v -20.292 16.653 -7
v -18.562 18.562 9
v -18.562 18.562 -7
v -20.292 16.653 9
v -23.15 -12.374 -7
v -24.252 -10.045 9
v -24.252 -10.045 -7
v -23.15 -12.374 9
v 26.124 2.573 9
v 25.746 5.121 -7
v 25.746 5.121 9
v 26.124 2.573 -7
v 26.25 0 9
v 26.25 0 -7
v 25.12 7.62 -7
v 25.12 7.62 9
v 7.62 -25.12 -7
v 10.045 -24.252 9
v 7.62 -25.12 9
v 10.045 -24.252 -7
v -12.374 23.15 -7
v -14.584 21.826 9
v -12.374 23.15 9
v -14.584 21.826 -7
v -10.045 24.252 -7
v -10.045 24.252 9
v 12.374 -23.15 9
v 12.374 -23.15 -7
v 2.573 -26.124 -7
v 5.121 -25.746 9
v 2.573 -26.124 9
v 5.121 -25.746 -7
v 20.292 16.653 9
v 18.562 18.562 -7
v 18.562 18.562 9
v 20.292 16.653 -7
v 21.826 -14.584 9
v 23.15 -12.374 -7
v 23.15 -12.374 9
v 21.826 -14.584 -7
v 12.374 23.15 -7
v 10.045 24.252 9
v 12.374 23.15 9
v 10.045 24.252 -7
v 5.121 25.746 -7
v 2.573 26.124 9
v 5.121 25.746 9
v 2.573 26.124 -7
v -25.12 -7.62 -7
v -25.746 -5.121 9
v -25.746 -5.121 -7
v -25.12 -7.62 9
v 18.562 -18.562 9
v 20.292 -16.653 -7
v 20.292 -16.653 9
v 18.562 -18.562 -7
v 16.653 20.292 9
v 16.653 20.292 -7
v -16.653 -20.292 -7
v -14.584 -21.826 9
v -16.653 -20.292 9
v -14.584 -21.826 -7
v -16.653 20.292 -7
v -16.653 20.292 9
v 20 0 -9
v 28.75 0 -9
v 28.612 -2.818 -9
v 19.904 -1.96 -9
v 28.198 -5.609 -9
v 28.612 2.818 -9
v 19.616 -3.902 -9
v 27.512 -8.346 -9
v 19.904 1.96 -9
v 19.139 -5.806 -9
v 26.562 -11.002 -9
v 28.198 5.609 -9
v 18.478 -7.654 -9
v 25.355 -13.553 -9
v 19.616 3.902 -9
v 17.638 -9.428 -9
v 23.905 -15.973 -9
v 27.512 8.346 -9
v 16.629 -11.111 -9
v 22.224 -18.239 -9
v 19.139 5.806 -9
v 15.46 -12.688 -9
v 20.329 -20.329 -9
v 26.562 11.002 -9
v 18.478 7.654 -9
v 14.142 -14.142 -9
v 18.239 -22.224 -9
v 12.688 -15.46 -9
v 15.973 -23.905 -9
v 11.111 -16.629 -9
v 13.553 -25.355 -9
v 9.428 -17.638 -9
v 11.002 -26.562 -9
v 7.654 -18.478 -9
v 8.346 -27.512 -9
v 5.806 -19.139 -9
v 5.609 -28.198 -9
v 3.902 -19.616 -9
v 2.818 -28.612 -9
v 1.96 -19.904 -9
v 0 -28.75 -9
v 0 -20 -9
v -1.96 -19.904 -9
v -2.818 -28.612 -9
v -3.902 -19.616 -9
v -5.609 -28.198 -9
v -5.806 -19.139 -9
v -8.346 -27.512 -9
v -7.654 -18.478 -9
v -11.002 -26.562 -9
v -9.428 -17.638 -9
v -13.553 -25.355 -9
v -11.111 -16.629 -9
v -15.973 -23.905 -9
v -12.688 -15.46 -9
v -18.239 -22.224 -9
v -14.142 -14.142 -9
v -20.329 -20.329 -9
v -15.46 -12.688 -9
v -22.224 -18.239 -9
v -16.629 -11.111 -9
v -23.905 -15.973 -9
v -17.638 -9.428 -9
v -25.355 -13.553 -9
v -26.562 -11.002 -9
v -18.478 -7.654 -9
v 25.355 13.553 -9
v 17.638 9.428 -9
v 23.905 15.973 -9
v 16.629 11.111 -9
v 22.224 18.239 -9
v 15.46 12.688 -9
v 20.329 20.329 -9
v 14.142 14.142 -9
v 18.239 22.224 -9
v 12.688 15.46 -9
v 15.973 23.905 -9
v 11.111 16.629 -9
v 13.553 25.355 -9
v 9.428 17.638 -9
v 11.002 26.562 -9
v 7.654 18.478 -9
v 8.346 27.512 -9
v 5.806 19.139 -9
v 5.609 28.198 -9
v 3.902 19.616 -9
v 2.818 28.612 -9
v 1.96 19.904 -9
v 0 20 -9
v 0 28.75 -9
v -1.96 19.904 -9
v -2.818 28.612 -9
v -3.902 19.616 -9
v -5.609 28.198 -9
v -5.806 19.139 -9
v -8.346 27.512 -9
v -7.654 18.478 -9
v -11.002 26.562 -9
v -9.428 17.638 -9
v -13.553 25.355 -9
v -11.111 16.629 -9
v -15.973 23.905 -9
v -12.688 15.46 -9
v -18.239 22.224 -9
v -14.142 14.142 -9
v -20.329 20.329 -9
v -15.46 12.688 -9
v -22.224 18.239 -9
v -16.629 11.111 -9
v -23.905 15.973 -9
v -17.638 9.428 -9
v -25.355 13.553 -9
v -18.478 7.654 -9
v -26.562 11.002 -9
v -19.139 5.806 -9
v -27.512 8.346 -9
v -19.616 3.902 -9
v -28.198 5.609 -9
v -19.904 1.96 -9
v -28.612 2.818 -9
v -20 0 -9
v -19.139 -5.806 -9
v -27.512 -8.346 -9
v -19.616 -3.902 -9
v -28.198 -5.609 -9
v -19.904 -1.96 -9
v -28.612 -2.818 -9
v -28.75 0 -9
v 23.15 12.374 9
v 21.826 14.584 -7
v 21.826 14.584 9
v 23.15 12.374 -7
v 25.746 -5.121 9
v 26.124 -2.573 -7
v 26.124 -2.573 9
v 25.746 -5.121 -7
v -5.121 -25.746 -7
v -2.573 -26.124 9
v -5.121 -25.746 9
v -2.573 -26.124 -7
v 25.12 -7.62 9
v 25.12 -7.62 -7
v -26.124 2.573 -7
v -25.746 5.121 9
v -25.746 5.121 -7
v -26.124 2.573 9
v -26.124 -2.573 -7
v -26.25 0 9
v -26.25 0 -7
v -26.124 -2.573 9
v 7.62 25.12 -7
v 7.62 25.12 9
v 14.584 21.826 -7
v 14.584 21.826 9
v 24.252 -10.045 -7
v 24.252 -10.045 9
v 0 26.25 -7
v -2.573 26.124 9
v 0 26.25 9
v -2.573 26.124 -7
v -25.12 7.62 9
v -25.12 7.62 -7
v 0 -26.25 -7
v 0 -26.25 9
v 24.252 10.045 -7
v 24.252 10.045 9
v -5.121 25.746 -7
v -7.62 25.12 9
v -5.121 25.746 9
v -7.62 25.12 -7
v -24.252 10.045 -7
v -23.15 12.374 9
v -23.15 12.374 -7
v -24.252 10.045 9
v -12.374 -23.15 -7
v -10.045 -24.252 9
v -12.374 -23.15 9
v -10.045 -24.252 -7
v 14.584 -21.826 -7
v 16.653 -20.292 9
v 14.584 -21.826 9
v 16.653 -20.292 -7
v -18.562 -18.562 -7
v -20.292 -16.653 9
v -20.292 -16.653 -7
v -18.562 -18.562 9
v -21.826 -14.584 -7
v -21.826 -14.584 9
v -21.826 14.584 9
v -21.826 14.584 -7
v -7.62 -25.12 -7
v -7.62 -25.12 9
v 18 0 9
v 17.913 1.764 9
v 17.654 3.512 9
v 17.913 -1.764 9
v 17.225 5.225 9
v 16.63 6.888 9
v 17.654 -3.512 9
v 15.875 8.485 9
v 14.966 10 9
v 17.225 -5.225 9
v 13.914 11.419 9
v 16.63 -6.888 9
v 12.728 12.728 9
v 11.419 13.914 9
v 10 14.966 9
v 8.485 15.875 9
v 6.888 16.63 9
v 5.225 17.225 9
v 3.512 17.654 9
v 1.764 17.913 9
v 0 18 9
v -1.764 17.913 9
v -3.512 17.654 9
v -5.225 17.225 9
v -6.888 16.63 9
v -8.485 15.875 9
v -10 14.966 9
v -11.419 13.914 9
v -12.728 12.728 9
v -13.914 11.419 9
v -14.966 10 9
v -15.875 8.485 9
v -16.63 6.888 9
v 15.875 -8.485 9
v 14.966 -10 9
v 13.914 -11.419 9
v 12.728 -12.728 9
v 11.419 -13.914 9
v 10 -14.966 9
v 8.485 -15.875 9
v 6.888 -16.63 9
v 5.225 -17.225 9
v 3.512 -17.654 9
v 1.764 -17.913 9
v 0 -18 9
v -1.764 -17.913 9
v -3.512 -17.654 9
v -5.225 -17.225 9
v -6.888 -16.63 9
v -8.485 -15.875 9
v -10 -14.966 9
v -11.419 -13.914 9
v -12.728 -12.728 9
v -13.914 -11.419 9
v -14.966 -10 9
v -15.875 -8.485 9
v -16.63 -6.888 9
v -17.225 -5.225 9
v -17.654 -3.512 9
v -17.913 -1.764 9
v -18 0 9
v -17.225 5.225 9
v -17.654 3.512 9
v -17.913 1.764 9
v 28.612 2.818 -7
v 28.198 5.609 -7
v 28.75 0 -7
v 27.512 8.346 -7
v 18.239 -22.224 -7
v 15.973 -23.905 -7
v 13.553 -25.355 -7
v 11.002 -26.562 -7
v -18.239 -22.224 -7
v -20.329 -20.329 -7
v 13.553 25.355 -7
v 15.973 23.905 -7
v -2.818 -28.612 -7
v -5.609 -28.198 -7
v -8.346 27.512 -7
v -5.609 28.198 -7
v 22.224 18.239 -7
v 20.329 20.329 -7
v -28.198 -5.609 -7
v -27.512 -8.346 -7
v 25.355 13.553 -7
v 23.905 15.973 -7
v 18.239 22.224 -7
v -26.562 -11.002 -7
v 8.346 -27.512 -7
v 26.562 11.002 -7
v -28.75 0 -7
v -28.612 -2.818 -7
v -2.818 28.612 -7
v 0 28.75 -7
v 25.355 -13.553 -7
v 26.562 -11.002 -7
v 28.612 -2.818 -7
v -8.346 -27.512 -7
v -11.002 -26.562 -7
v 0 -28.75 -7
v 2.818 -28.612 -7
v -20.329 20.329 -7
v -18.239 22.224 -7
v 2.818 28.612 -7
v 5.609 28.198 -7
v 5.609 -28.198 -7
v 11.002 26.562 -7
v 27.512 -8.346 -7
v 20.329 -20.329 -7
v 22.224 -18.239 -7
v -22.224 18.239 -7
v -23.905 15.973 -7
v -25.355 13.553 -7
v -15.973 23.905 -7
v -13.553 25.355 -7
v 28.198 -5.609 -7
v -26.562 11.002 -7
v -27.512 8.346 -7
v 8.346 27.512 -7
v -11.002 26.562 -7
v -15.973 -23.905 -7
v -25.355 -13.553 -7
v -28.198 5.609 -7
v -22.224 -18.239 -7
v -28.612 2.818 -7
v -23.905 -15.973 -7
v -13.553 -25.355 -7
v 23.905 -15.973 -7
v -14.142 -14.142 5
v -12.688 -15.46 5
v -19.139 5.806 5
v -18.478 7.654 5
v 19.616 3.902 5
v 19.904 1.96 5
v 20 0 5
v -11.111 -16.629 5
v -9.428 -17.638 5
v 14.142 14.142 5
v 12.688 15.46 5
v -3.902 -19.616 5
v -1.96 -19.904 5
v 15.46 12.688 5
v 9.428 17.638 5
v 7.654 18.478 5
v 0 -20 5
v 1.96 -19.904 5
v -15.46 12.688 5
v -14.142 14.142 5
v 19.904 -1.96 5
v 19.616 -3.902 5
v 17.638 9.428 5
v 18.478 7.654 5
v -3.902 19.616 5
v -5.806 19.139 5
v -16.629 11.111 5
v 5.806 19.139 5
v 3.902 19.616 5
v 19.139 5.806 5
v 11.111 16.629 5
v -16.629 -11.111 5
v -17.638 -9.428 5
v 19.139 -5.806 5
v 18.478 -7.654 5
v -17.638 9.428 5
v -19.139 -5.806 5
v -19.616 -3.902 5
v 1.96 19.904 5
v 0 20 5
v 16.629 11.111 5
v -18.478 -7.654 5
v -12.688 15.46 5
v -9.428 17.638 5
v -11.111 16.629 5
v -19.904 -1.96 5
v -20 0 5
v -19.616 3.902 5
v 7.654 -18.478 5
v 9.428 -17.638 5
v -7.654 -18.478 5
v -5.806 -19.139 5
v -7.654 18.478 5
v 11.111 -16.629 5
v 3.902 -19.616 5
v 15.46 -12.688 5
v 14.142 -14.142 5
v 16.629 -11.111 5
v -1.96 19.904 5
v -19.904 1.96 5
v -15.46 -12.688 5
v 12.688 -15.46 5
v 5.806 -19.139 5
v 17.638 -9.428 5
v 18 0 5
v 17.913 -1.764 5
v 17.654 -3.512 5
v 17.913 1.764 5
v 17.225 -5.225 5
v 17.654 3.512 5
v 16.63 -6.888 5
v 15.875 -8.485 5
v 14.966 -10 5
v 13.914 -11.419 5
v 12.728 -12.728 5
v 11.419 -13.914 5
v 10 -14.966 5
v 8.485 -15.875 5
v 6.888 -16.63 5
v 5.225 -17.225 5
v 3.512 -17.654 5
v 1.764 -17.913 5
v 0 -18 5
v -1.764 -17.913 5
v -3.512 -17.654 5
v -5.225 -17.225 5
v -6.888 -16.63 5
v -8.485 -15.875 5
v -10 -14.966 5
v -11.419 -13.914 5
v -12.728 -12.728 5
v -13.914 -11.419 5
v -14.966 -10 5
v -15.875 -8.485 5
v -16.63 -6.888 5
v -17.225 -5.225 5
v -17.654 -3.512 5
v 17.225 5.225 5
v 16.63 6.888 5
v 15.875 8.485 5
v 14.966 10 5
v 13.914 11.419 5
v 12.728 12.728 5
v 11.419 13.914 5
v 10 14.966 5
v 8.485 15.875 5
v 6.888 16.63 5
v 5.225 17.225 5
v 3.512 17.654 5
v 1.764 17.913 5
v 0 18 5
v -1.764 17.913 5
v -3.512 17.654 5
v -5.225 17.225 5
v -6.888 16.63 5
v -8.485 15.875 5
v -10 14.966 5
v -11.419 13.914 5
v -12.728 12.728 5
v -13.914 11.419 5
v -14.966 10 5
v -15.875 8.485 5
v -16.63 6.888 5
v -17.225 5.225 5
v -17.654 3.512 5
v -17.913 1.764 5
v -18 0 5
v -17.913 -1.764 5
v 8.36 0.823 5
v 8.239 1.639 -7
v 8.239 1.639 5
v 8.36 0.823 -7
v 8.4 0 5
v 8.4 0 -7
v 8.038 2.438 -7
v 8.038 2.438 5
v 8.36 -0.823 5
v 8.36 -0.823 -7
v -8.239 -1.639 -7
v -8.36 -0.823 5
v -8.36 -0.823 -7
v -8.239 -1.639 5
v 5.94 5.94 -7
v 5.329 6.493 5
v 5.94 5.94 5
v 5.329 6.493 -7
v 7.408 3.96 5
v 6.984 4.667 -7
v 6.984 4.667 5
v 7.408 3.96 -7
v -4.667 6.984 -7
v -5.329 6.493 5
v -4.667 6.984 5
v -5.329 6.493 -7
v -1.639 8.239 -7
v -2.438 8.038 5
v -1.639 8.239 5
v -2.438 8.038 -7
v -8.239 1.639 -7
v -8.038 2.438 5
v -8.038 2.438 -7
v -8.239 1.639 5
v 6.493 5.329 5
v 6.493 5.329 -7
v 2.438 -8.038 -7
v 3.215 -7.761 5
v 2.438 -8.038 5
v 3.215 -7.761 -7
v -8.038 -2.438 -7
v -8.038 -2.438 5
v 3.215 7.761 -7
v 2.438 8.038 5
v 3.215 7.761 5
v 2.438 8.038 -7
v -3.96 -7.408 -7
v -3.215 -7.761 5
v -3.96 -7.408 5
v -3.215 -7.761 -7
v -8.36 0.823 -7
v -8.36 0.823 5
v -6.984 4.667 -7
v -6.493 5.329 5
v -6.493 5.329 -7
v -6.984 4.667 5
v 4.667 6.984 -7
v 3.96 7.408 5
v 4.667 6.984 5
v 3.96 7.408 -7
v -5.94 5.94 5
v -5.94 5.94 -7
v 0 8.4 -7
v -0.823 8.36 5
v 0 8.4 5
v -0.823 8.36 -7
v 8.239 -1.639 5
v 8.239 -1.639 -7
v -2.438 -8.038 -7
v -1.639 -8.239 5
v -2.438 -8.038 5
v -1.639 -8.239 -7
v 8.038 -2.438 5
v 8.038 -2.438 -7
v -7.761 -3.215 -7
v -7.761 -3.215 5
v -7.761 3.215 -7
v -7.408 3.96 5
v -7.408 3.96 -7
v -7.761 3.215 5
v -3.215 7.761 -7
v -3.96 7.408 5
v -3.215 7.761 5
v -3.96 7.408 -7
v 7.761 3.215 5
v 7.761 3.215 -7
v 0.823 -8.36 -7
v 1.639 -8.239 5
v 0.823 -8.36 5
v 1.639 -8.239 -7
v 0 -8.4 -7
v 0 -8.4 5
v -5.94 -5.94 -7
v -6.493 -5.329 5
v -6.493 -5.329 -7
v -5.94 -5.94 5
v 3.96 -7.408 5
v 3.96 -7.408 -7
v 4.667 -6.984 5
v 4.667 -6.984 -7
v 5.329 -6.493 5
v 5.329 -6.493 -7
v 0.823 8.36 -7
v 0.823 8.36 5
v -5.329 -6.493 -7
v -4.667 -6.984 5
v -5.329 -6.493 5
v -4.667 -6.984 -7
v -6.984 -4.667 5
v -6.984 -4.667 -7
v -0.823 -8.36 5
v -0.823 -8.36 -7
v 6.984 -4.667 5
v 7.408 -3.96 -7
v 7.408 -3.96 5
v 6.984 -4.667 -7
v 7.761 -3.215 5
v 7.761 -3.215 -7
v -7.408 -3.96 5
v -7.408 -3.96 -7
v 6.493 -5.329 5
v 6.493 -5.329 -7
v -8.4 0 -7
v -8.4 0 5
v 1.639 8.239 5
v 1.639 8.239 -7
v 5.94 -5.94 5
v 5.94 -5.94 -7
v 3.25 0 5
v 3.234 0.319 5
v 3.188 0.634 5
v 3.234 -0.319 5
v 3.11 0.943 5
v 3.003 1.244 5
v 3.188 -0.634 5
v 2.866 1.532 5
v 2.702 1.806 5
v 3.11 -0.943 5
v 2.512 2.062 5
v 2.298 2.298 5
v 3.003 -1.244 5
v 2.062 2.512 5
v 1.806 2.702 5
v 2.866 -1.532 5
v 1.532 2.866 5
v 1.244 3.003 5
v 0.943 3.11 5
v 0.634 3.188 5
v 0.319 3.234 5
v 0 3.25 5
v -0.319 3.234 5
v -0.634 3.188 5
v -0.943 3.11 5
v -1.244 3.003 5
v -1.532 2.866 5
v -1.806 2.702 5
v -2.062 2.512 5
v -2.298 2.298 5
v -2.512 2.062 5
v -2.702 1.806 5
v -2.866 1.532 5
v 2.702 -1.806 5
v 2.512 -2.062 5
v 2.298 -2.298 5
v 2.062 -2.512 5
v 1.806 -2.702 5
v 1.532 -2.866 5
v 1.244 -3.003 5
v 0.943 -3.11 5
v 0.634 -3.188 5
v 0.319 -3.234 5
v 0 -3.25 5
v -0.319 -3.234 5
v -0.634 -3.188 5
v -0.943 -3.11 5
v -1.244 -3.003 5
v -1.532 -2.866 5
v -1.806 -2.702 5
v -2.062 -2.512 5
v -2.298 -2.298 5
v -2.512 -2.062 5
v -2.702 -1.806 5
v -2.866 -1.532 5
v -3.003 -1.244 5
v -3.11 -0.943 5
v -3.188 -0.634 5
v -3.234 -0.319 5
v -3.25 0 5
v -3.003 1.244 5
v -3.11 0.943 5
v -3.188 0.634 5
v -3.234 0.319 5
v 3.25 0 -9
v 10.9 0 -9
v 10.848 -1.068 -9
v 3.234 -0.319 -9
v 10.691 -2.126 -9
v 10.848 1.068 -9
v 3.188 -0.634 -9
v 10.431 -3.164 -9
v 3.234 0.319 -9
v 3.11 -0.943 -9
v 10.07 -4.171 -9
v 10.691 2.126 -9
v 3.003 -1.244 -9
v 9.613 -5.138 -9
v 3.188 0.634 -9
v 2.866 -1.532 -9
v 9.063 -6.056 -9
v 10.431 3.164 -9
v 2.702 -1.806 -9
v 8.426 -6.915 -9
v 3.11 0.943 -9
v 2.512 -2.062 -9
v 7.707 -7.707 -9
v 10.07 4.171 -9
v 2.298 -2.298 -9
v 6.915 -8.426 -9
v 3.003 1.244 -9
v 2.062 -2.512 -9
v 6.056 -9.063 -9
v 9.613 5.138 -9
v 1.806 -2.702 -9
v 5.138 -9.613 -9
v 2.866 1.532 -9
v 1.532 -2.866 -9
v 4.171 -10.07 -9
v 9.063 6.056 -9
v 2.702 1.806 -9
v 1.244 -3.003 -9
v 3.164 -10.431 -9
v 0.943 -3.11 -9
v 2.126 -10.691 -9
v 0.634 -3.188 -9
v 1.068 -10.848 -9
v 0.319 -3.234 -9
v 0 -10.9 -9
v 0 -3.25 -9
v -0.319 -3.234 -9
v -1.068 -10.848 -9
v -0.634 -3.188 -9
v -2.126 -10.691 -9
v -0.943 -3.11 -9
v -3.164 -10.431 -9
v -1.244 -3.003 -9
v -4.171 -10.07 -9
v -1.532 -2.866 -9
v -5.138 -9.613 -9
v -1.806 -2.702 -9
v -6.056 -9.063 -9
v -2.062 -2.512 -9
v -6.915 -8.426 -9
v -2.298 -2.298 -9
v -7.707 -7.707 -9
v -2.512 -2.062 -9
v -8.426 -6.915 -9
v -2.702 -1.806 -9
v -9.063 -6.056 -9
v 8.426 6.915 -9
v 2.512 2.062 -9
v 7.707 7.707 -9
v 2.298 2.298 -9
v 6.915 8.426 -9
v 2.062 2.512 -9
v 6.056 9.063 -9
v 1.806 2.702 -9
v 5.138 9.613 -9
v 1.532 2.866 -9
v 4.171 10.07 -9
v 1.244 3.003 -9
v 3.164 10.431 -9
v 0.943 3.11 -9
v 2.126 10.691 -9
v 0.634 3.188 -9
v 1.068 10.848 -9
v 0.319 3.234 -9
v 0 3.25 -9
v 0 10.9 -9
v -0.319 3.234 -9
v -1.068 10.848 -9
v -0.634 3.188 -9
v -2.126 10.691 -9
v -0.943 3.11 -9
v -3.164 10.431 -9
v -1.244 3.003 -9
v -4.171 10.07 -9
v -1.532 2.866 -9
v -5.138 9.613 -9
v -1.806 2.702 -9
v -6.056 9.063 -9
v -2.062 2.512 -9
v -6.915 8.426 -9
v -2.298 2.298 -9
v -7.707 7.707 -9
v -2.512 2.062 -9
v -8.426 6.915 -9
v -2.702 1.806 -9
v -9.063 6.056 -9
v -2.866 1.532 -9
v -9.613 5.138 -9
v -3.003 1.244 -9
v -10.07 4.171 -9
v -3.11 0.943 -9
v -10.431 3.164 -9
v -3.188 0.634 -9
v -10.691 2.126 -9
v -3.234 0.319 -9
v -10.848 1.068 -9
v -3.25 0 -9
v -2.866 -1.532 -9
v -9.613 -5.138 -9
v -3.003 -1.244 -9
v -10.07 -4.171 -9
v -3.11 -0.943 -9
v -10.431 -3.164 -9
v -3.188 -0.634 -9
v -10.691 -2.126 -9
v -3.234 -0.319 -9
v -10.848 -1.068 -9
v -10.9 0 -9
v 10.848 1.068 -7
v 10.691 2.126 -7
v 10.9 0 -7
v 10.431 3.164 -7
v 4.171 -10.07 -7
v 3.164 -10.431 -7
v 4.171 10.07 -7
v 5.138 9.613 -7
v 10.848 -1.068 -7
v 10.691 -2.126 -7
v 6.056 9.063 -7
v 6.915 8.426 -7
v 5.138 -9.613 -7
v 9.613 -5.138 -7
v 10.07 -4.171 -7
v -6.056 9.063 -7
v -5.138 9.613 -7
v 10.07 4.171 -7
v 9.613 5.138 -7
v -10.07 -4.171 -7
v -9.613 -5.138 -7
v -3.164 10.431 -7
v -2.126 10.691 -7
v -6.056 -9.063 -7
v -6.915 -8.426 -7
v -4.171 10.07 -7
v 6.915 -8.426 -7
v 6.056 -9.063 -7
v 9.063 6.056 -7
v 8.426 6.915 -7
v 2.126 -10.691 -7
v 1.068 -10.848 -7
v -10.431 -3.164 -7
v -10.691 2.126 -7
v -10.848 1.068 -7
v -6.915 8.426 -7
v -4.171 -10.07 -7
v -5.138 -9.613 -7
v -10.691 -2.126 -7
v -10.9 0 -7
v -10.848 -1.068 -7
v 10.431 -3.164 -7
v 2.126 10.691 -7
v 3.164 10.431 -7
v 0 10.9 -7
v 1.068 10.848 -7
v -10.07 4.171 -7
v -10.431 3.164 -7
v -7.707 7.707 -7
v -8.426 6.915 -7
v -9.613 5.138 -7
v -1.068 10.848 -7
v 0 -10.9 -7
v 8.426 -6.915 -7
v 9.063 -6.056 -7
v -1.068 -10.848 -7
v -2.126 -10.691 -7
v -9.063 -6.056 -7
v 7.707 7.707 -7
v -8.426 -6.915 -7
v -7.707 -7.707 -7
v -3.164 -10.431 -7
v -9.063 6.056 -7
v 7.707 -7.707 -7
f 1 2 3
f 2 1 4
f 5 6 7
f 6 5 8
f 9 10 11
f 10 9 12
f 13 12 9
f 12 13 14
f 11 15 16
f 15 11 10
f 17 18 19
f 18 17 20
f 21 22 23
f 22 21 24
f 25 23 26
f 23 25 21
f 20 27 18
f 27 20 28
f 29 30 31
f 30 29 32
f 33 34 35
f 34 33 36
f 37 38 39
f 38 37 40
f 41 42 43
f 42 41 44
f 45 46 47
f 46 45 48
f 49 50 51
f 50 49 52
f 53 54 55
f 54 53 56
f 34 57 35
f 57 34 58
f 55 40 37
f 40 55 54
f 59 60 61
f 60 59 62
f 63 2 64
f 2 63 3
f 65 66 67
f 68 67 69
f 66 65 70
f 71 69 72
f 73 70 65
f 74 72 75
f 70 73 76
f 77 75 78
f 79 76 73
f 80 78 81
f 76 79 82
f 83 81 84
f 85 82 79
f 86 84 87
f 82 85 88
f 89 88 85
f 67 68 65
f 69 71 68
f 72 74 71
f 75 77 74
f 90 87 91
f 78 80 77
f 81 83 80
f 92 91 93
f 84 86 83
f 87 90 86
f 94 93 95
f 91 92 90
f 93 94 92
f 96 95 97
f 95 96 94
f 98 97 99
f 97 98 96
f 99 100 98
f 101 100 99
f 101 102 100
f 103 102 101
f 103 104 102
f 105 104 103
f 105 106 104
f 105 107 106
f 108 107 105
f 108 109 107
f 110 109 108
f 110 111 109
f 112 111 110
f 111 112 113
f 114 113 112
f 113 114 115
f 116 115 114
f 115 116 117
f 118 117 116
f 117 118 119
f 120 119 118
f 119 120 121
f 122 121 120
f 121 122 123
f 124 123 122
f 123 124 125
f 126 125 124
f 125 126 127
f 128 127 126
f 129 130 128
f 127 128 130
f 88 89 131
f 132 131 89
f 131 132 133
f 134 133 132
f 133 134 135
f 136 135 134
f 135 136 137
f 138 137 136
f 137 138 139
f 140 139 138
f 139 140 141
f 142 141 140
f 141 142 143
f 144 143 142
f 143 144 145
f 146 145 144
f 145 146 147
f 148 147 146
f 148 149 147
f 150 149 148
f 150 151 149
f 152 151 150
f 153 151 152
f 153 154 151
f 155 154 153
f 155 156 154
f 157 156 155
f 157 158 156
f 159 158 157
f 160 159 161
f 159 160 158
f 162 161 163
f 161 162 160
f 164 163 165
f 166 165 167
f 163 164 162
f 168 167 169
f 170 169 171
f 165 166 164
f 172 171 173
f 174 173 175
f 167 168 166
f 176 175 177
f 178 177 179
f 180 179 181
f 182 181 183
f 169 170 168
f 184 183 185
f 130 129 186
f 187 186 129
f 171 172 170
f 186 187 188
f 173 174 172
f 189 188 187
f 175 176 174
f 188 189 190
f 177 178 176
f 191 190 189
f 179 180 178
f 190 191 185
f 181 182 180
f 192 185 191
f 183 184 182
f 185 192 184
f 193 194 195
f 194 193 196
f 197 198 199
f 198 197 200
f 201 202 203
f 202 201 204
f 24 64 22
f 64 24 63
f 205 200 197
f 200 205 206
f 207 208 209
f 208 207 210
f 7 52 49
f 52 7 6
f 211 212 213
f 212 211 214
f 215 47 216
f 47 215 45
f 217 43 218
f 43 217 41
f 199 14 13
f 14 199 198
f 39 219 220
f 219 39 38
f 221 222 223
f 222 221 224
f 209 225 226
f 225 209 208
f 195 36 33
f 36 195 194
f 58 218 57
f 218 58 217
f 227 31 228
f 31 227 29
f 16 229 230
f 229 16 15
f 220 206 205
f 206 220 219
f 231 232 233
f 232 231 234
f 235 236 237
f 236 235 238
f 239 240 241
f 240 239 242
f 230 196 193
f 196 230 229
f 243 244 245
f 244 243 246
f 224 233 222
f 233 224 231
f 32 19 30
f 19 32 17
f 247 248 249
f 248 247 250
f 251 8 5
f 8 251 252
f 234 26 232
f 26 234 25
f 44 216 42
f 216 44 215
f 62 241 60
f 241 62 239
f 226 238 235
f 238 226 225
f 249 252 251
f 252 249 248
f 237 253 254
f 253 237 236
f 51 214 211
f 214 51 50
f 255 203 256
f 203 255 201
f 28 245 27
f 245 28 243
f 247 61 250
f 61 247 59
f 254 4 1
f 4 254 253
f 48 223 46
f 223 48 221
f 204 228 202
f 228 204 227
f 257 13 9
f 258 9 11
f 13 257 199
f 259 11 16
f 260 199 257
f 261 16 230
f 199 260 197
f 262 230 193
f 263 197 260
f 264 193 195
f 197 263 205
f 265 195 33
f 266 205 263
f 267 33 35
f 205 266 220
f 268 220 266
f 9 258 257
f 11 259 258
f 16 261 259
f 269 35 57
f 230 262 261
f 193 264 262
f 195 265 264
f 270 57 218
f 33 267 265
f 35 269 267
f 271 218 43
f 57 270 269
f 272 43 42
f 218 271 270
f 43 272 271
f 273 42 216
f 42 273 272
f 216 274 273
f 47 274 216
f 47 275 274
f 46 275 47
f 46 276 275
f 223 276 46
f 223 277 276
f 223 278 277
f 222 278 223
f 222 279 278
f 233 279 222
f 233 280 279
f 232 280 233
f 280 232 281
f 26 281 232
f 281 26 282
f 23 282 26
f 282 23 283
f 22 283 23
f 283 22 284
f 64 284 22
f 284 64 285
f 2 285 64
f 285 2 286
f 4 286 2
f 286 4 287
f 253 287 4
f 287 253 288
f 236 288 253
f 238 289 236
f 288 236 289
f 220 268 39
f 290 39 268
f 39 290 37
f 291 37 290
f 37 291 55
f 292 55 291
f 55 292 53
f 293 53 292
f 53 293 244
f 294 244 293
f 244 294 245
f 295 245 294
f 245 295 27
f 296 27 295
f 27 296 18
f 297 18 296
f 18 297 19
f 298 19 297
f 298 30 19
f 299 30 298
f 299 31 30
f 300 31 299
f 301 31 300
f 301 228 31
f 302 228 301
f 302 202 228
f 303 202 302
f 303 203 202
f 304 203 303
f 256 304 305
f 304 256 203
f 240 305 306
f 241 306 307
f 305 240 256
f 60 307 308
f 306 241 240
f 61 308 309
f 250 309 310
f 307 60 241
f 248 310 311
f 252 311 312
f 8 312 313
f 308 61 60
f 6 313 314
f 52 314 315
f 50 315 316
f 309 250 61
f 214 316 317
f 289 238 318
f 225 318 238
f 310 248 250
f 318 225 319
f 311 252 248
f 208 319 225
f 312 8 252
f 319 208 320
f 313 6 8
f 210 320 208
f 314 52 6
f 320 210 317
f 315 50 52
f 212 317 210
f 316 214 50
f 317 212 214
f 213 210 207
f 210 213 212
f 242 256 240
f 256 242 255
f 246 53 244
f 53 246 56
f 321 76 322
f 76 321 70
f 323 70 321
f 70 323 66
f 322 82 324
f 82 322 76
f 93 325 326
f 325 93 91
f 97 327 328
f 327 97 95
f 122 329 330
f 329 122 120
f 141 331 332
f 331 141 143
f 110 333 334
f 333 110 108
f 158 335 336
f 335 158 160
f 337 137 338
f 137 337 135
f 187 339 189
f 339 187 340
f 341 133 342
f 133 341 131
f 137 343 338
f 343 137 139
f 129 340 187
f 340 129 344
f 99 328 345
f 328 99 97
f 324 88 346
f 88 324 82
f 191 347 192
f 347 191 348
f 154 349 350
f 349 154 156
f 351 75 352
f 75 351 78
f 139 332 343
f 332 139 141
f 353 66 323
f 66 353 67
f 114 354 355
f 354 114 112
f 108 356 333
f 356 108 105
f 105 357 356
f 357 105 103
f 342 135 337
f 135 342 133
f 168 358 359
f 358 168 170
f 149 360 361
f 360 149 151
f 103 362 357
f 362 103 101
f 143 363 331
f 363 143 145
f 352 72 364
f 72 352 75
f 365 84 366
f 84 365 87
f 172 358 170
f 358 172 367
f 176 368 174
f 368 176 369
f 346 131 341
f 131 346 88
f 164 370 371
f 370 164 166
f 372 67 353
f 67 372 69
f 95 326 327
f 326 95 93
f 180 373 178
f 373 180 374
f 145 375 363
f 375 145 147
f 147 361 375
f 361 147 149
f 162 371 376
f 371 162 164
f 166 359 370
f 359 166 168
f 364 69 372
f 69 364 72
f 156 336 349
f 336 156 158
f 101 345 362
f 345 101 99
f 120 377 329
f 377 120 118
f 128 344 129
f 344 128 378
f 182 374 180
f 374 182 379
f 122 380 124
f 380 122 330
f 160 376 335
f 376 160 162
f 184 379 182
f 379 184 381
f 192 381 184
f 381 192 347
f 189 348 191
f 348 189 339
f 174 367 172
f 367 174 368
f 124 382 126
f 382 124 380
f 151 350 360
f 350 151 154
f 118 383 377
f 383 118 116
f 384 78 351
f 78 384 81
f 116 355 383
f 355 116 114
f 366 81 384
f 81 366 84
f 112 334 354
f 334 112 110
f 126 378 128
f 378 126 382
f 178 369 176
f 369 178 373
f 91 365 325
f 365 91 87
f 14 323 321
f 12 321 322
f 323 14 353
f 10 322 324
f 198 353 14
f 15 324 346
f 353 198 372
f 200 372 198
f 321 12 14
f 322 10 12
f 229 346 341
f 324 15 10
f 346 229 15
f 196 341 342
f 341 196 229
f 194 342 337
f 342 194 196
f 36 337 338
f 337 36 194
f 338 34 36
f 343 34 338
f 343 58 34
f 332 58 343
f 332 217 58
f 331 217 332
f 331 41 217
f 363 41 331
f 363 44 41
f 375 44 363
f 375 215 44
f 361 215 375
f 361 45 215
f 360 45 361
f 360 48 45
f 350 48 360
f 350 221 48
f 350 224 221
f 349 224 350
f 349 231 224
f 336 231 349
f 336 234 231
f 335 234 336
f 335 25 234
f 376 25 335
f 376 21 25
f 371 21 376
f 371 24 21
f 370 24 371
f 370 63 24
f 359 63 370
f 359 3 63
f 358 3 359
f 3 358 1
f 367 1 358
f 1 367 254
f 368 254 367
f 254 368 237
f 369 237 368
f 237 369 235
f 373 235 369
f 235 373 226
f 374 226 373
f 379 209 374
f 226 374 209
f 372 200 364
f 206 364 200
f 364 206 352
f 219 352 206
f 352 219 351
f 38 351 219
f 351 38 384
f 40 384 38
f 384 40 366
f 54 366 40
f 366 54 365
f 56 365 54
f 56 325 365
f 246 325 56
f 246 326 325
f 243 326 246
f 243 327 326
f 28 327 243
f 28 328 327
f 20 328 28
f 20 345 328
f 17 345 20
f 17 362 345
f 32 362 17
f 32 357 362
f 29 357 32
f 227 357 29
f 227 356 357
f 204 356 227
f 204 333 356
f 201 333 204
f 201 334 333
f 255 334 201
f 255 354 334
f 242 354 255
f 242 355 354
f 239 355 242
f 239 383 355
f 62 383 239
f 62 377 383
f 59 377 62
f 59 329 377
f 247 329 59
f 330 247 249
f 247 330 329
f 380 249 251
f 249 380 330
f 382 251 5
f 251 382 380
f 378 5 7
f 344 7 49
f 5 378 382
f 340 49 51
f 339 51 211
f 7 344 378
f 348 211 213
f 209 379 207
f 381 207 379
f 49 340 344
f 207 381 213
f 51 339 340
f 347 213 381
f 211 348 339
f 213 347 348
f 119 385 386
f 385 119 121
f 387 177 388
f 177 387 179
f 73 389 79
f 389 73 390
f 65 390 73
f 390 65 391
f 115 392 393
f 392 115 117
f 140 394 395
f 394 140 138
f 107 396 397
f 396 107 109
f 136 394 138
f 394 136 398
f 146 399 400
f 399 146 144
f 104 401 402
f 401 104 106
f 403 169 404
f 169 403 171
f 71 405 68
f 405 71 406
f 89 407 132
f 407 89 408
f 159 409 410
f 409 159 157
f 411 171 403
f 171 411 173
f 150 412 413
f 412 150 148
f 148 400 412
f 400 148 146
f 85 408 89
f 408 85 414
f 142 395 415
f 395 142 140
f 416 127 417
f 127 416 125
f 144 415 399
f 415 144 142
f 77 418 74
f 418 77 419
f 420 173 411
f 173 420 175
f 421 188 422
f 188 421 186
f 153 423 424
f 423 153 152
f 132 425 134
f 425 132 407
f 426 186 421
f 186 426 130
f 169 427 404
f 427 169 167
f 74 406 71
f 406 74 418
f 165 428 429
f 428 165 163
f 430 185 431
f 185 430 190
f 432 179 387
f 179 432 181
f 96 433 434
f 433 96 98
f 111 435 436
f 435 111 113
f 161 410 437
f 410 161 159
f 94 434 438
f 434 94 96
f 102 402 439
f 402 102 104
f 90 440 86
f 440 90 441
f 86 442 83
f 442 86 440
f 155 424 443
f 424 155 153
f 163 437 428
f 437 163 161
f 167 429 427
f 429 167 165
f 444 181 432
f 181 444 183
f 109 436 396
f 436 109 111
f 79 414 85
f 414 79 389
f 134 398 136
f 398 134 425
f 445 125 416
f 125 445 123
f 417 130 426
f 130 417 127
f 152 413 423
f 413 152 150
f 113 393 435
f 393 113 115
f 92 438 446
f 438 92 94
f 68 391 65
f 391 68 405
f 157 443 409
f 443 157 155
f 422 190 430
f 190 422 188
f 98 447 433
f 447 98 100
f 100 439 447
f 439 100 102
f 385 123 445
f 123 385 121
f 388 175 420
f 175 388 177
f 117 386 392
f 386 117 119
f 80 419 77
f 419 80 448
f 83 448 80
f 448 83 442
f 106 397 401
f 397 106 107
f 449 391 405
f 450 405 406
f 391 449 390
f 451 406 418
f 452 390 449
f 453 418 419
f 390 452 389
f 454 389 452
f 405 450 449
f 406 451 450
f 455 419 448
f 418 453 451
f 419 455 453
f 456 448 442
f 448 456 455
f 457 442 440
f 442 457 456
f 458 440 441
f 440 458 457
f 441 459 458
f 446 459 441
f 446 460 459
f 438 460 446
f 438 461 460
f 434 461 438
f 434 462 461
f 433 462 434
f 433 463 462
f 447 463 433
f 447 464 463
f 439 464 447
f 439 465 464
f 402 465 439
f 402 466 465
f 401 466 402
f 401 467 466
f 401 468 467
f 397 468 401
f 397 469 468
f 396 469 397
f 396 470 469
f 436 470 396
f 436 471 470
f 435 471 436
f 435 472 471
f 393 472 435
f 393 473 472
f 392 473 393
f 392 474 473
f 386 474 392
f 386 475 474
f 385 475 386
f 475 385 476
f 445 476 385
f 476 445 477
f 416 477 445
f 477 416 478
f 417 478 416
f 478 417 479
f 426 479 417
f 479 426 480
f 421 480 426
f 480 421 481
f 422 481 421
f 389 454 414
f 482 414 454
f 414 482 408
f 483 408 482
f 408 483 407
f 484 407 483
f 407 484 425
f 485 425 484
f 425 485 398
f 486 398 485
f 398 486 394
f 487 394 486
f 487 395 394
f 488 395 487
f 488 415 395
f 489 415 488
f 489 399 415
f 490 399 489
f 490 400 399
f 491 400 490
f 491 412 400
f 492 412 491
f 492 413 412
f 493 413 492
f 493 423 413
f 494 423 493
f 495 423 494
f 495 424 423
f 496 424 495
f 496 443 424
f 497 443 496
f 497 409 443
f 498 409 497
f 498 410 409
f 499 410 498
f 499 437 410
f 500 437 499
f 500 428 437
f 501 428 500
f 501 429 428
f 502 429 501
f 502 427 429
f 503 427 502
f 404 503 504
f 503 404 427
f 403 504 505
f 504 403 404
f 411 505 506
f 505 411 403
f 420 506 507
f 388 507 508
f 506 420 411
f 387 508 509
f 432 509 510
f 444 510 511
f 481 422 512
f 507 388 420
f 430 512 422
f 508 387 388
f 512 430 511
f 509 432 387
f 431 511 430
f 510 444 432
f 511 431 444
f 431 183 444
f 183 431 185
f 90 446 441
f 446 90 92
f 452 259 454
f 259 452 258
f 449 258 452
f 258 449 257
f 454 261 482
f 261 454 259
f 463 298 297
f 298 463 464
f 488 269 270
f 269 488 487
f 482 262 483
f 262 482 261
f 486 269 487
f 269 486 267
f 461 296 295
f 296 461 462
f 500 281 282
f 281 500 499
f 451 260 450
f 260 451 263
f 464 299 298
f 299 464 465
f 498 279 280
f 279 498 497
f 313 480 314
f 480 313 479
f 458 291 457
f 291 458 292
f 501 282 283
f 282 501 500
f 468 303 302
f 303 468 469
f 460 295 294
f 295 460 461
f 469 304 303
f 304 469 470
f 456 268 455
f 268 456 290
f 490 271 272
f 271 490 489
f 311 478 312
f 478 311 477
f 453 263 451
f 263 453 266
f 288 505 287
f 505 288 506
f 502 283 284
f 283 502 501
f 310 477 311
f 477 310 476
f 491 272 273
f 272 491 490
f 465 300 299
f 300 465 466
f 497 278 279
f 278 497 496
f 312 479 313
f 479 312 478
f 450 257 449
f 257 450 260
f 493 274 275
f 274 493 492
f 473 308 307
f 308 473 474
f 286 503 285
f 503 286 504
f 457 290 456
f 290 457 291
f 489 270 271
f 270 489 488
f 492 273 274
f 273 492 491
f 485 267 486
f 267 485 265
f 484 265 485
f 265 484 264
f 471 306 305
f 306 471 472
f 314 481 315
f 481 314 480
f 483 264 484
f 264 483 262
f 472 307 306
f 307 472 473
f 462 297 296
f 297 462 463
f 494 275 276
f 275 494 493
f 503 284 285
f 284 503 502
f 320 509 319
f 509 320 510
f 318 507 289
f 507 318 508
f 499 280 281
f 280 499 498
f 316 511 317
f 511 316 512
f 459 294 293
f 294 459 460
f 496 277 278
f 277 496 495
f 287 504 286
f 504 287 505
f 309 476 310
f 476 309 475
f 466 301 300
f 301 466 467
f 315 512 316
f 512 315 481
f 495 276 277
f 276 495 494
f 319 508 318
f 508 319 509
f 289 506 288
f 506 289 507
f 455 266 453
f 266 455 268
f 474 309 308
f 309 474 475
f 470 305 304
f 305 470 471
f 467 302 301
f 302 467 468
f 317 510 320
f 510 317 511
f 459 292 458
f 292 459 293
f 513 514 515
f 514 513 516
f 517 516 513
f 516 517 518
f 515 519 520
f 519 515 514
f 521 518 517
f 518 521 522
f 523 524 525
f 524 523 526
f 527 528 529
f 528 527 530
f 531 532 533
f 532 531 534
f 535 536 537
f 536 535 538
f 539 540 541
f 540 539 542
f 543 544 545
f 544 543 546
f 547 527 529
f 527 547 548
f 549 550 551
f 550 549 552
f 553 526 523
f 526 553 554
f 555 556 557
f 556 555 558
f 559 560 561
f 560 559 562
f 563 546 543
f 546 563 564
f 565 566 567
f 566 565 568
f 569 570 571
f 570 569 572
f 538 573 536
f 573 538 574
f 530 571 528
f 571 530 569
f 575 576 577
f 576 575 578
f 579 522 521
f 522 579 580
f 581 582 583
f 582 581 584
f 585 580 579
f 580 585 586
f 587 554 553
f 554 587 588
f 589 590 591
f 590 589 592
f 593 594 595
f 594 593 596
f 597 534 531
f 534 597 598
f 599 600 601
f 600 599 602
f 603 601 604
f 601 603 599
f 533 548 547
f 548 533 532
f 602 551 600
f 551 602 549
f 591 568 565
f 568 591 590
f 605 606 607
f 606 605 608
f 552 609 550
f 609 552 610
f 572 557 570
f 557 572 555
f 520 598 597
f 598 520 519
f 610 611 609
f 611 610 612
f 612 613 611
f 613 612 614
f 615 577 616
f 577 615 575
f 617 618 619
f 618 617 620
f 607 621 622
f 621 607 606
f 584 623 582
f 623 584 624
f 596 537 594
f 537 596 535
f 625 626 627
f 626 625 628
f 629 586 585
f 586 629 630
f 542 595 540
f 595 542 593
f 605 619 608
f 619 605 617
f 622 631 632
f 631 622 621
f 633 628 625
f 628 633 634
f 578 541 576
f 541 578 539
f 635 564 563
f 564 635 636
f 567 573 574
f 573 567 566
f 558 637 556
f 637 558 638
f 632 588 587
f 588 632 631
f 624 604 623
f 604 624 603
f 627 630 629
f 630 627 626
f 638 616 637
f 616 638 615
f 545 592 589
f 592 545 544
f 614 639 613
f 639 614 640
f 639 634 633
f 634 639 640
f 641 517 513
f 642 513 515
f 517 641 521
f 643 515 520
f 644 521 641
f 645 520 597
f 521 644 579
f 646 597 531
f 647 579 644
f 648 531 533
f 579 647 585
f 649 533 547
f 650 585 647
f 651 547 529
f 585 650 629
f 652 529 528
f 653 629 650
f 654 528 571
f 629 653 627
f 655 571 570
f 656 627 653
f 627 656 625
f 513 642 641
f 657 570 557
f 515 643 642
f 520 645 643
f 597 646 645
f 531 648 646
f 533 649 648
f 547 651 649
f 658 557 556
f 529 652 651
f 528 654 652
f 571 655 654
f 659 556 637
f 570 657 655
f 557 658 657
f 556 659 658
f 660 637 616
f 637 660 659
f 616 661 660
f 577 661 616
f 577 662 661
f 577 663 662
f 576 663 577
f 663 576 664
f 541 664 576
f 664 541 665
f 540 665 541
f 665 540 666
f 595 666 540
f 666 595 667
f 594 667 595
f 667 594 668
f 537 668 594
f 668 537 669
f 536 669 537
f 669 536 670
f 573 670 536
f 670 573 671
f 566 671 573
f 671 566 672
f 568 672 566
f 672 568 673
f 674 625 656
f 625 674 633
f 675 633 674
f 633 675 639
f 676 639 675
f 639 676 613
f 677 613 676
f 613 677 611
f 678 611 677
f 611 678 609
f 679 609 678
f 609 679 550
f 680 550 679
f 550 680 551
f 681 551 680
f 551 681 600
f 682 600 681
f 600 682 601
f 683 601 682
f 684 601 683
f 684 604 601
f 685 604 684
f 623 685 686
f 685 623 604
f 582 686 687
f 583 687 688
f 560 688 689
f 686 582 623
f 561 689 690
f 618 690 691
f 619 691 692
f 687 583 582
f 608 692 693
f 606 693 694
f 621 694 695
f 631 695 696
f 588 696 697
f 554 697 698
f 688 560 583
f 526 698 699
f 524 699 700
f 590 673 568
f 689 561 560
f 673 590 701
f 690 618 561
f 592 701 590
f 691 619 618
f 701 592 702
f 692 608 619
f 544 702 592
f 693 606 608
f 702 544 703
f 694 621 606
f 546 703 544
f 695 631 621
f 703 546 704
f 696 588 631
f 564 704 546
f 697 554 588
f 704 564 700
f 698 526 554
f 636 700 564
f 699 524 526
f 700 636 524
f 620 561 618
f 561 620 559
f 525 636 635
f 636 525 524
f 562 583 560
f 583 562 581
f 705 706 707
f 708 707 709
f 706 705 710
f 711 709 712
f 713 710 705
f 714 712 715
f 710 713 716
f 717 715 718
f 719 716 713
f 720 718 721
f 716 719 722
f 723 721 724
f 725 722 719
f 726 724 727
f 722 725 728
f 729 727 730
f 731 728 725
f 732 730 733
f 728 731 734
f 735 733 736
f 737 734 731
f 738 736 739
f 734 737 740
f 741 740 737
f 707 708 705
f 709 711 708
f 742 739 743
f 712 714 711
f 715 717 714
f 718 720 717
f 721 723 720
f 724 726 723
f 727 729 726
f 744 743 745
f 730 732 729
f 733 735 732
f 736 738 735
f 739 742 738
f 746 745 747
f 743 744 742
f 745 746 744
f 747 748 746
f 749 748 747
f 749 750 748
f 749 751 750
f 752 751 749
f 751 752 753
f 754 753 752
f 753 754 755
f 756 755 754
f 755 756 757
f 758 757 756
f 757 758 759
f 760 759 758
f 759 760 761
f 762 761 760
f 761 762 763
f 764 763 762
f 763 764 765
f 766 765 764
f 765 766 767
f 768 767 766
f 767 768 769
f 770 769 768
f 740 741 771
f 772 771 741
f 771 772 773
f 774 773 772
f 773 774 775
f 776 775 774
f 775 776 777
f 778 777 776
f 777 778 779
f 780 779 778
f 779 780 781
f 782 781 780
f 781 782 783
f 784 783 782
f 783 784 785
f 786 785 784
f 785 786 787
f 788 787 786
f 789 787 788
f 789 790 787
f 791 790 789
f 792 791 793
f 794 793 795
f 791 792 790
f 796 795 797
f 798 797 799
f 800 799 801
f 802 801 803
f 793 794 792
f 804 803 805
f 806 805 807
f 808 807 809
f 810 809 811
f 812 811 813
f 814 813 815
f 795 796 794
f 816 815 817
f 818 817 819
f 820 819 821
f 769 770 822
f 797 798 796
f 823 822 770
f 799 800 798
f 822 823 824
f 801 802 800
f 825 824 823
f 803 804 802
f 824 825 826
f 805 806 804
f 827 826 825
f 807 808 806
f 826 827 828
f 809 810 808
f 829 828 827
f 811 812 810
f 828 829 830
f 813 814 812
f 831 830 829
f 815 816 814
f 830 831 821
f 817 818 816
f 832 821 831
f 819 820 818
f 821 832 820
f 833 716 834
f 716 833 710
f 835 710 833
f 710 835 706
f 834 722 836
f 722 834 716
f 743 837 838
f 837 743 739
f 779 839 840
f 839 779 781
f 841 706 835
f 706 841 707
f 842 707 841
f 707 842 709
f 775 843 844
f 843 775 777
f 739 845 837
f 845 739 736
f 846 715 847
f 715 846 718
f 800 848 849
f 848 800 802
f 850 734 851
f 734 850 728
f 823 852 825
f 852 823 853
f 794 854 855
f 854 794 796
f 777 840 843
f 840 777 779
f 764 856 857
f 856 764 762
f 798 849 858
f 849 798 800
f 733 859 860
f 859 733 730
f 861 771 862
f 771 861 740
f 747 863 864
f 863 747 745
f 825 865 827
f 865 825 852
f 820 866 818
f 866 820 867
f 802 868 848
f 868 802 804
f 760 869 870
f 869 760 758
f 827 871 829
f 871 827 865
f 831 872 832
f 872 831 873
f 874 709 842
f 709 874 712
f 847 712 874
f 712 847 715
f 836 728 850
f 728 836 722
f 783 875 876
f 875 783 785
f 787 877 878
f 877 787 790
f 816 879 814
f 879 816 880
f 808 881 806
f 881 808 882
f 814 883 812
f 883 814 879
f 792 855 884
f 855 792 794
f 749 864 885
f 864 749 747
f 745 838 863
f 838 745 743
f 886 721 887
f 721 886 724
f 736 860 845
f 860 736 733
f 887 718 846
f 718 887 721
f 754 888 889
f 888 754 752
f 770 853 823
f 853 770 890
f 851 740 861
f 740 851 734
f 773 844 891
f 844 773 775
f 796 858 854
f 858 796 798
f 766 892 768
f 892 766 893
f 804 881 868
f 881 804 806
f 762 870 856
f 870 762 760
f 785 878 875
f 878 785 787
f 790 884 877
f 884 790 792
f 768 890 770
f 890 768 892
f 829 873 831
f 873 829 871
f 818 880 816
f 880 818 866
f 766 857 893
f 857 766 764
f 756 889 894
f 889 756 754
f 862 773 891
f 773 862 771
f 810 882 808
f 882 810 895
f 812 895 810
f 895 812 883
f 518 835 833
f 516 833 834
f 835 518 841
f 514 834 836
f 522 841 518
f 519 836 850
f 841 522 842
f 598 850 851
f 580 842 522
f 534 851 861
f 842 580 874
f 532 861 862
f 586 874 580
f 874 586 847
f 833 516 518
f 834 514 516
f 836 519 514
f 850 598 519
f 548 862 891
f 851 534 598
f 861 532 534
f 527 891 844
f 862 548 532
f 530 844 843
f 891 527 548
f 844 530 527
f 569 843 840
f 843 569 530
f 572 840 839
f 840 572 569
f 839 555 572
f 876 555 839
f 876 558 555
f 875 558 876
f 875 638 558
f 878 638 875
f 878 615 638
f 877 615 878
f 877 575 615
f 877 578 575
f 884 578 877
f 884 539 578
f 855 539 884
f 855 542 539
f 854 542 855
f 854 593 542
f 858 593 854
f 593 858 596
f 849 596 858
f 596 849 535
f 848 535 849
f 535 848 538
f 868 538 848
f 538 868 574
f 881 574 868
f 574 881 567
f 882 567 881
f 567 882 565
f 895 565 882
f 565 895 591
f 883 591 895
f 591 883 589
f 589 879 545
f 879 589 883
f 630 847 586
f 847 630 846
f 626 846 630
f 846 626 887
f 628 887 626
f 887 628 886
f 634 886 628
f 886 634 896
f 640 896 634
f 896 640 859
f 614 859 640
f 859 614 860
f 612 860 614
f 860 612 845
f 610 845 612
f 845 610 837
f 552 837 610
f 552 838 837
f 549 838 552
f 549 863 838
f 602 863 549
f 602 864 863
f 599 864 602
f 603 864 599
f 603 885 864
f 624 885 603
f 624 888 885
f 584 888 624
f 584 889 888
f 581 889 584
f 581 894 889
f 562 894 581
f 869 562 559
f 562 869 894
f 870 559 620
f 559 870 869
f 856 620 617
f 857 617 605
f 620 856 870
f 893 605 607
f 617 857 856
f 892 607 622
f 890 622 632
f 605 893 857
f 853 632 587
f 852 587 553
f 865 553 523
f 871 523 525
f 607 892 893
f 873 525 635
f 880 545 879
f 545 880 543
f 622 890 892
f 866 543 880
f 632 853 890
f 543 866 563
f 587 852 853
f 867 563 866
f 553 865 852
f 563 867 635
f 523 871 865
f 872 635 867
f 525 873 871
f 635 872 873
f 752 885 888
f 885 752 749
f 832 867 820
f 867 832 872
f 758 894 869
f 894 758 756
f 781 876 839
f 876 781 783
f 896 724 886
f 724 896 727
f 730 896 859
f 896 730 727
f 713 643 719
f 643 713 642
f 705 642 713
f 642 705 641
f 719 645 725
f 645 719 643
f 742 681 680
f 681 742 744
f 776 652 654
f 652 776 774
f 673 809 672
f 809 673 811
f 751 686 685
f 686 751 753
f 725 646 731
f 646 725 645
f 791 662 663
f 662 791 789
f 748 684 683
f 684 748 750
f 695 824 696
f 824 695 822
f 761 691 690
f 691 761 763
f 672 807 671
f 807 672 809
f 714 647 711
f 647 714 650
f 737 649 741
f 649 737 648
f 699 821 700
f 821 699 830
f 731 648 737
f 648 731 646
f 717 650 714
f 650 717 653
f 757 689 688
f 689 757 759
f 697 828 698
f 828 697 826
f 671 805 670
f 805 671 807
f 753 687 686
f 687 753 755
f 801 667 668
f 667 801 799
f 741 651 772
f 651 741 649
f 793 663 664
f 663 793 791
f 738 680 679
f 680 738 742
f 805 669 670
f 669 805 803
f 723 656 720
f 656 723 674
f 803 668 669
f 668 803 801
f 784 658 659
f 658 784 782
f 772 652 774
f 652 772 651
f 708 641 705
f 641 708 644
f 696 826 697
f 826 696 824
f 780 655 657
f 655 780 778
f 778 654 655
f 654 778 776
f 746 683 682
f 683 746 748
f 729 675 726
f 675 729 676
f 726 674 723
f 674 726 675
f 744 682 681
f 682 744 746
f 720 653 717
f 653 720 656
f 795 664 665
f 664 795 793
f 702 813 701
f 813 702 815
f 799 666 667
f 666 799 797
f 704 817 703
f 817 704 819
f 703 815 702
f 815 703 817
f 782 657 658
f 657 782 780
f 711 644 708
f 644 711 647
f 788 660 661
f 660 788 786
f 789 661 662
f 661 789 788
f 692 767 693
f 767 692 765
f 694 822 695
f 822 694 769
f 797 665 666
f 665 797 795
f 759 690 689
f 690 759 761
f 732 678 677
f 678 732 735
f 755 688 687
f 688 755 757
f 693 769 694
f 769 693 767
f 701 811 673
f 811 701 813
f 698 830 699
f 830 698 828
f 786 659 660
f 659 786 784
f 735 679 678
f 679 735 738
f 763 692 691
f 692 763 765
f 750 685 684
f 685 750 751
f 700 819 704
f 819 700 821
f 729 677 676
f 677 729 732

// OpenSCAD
/* Domecek pro lozisko spulky fillamentu
Blind Pew <blind.pew96@gmail.com>
GNU v3
*/

module rolna() {
	$fn = 64;
	spulka_prumer = 52.5; //diameter
	spulka_vyska = 18; //height
	//rozmery pro lozisko 6203
	loz_vnejsi = 40; //external diameter bearing
	loz_vyska = 14; //height bearing
	loz_vnitr = 16.8; //internal diameter bearing
	dira = 6.5; //hole
	hrana = 2;

	difference() {
		union() {
			cylinder(d = spulka_prumer, h = spulka_vyska, center = true);
			translate([0,0,-((spulka_vyska-hrana)/2)])			
				cylinder(d = spulka_prumer+5, h = hrana, center = true);
		}
		translate([0,0,-((spulka_vyska-loz_vyska)/2)])
			cylinder(d = loz_vnejsi, h = loz_vyska, center = true);
		cylinder(d = loz_vnejsi-hrana*2, h = spulka_vyska, center = true);
		cylinder(d = dira, h = spulka_vyska, center = true);
	}
	translate([0,0,-((spulka_vyska-loz_vyska)/2)])
		difference() {
			union() {
				cylinder(d = loz_vnitr, h = loz_vyska, center = true);
				translate([0,0,-((loz_vyska-hrana)/2)])
					cylinder(d = loz_vnitr+5, h = hrana, center = true);
			}
			cylinder(d = dira, h = loz_vyska, center = true);
		}
}
rolna();
